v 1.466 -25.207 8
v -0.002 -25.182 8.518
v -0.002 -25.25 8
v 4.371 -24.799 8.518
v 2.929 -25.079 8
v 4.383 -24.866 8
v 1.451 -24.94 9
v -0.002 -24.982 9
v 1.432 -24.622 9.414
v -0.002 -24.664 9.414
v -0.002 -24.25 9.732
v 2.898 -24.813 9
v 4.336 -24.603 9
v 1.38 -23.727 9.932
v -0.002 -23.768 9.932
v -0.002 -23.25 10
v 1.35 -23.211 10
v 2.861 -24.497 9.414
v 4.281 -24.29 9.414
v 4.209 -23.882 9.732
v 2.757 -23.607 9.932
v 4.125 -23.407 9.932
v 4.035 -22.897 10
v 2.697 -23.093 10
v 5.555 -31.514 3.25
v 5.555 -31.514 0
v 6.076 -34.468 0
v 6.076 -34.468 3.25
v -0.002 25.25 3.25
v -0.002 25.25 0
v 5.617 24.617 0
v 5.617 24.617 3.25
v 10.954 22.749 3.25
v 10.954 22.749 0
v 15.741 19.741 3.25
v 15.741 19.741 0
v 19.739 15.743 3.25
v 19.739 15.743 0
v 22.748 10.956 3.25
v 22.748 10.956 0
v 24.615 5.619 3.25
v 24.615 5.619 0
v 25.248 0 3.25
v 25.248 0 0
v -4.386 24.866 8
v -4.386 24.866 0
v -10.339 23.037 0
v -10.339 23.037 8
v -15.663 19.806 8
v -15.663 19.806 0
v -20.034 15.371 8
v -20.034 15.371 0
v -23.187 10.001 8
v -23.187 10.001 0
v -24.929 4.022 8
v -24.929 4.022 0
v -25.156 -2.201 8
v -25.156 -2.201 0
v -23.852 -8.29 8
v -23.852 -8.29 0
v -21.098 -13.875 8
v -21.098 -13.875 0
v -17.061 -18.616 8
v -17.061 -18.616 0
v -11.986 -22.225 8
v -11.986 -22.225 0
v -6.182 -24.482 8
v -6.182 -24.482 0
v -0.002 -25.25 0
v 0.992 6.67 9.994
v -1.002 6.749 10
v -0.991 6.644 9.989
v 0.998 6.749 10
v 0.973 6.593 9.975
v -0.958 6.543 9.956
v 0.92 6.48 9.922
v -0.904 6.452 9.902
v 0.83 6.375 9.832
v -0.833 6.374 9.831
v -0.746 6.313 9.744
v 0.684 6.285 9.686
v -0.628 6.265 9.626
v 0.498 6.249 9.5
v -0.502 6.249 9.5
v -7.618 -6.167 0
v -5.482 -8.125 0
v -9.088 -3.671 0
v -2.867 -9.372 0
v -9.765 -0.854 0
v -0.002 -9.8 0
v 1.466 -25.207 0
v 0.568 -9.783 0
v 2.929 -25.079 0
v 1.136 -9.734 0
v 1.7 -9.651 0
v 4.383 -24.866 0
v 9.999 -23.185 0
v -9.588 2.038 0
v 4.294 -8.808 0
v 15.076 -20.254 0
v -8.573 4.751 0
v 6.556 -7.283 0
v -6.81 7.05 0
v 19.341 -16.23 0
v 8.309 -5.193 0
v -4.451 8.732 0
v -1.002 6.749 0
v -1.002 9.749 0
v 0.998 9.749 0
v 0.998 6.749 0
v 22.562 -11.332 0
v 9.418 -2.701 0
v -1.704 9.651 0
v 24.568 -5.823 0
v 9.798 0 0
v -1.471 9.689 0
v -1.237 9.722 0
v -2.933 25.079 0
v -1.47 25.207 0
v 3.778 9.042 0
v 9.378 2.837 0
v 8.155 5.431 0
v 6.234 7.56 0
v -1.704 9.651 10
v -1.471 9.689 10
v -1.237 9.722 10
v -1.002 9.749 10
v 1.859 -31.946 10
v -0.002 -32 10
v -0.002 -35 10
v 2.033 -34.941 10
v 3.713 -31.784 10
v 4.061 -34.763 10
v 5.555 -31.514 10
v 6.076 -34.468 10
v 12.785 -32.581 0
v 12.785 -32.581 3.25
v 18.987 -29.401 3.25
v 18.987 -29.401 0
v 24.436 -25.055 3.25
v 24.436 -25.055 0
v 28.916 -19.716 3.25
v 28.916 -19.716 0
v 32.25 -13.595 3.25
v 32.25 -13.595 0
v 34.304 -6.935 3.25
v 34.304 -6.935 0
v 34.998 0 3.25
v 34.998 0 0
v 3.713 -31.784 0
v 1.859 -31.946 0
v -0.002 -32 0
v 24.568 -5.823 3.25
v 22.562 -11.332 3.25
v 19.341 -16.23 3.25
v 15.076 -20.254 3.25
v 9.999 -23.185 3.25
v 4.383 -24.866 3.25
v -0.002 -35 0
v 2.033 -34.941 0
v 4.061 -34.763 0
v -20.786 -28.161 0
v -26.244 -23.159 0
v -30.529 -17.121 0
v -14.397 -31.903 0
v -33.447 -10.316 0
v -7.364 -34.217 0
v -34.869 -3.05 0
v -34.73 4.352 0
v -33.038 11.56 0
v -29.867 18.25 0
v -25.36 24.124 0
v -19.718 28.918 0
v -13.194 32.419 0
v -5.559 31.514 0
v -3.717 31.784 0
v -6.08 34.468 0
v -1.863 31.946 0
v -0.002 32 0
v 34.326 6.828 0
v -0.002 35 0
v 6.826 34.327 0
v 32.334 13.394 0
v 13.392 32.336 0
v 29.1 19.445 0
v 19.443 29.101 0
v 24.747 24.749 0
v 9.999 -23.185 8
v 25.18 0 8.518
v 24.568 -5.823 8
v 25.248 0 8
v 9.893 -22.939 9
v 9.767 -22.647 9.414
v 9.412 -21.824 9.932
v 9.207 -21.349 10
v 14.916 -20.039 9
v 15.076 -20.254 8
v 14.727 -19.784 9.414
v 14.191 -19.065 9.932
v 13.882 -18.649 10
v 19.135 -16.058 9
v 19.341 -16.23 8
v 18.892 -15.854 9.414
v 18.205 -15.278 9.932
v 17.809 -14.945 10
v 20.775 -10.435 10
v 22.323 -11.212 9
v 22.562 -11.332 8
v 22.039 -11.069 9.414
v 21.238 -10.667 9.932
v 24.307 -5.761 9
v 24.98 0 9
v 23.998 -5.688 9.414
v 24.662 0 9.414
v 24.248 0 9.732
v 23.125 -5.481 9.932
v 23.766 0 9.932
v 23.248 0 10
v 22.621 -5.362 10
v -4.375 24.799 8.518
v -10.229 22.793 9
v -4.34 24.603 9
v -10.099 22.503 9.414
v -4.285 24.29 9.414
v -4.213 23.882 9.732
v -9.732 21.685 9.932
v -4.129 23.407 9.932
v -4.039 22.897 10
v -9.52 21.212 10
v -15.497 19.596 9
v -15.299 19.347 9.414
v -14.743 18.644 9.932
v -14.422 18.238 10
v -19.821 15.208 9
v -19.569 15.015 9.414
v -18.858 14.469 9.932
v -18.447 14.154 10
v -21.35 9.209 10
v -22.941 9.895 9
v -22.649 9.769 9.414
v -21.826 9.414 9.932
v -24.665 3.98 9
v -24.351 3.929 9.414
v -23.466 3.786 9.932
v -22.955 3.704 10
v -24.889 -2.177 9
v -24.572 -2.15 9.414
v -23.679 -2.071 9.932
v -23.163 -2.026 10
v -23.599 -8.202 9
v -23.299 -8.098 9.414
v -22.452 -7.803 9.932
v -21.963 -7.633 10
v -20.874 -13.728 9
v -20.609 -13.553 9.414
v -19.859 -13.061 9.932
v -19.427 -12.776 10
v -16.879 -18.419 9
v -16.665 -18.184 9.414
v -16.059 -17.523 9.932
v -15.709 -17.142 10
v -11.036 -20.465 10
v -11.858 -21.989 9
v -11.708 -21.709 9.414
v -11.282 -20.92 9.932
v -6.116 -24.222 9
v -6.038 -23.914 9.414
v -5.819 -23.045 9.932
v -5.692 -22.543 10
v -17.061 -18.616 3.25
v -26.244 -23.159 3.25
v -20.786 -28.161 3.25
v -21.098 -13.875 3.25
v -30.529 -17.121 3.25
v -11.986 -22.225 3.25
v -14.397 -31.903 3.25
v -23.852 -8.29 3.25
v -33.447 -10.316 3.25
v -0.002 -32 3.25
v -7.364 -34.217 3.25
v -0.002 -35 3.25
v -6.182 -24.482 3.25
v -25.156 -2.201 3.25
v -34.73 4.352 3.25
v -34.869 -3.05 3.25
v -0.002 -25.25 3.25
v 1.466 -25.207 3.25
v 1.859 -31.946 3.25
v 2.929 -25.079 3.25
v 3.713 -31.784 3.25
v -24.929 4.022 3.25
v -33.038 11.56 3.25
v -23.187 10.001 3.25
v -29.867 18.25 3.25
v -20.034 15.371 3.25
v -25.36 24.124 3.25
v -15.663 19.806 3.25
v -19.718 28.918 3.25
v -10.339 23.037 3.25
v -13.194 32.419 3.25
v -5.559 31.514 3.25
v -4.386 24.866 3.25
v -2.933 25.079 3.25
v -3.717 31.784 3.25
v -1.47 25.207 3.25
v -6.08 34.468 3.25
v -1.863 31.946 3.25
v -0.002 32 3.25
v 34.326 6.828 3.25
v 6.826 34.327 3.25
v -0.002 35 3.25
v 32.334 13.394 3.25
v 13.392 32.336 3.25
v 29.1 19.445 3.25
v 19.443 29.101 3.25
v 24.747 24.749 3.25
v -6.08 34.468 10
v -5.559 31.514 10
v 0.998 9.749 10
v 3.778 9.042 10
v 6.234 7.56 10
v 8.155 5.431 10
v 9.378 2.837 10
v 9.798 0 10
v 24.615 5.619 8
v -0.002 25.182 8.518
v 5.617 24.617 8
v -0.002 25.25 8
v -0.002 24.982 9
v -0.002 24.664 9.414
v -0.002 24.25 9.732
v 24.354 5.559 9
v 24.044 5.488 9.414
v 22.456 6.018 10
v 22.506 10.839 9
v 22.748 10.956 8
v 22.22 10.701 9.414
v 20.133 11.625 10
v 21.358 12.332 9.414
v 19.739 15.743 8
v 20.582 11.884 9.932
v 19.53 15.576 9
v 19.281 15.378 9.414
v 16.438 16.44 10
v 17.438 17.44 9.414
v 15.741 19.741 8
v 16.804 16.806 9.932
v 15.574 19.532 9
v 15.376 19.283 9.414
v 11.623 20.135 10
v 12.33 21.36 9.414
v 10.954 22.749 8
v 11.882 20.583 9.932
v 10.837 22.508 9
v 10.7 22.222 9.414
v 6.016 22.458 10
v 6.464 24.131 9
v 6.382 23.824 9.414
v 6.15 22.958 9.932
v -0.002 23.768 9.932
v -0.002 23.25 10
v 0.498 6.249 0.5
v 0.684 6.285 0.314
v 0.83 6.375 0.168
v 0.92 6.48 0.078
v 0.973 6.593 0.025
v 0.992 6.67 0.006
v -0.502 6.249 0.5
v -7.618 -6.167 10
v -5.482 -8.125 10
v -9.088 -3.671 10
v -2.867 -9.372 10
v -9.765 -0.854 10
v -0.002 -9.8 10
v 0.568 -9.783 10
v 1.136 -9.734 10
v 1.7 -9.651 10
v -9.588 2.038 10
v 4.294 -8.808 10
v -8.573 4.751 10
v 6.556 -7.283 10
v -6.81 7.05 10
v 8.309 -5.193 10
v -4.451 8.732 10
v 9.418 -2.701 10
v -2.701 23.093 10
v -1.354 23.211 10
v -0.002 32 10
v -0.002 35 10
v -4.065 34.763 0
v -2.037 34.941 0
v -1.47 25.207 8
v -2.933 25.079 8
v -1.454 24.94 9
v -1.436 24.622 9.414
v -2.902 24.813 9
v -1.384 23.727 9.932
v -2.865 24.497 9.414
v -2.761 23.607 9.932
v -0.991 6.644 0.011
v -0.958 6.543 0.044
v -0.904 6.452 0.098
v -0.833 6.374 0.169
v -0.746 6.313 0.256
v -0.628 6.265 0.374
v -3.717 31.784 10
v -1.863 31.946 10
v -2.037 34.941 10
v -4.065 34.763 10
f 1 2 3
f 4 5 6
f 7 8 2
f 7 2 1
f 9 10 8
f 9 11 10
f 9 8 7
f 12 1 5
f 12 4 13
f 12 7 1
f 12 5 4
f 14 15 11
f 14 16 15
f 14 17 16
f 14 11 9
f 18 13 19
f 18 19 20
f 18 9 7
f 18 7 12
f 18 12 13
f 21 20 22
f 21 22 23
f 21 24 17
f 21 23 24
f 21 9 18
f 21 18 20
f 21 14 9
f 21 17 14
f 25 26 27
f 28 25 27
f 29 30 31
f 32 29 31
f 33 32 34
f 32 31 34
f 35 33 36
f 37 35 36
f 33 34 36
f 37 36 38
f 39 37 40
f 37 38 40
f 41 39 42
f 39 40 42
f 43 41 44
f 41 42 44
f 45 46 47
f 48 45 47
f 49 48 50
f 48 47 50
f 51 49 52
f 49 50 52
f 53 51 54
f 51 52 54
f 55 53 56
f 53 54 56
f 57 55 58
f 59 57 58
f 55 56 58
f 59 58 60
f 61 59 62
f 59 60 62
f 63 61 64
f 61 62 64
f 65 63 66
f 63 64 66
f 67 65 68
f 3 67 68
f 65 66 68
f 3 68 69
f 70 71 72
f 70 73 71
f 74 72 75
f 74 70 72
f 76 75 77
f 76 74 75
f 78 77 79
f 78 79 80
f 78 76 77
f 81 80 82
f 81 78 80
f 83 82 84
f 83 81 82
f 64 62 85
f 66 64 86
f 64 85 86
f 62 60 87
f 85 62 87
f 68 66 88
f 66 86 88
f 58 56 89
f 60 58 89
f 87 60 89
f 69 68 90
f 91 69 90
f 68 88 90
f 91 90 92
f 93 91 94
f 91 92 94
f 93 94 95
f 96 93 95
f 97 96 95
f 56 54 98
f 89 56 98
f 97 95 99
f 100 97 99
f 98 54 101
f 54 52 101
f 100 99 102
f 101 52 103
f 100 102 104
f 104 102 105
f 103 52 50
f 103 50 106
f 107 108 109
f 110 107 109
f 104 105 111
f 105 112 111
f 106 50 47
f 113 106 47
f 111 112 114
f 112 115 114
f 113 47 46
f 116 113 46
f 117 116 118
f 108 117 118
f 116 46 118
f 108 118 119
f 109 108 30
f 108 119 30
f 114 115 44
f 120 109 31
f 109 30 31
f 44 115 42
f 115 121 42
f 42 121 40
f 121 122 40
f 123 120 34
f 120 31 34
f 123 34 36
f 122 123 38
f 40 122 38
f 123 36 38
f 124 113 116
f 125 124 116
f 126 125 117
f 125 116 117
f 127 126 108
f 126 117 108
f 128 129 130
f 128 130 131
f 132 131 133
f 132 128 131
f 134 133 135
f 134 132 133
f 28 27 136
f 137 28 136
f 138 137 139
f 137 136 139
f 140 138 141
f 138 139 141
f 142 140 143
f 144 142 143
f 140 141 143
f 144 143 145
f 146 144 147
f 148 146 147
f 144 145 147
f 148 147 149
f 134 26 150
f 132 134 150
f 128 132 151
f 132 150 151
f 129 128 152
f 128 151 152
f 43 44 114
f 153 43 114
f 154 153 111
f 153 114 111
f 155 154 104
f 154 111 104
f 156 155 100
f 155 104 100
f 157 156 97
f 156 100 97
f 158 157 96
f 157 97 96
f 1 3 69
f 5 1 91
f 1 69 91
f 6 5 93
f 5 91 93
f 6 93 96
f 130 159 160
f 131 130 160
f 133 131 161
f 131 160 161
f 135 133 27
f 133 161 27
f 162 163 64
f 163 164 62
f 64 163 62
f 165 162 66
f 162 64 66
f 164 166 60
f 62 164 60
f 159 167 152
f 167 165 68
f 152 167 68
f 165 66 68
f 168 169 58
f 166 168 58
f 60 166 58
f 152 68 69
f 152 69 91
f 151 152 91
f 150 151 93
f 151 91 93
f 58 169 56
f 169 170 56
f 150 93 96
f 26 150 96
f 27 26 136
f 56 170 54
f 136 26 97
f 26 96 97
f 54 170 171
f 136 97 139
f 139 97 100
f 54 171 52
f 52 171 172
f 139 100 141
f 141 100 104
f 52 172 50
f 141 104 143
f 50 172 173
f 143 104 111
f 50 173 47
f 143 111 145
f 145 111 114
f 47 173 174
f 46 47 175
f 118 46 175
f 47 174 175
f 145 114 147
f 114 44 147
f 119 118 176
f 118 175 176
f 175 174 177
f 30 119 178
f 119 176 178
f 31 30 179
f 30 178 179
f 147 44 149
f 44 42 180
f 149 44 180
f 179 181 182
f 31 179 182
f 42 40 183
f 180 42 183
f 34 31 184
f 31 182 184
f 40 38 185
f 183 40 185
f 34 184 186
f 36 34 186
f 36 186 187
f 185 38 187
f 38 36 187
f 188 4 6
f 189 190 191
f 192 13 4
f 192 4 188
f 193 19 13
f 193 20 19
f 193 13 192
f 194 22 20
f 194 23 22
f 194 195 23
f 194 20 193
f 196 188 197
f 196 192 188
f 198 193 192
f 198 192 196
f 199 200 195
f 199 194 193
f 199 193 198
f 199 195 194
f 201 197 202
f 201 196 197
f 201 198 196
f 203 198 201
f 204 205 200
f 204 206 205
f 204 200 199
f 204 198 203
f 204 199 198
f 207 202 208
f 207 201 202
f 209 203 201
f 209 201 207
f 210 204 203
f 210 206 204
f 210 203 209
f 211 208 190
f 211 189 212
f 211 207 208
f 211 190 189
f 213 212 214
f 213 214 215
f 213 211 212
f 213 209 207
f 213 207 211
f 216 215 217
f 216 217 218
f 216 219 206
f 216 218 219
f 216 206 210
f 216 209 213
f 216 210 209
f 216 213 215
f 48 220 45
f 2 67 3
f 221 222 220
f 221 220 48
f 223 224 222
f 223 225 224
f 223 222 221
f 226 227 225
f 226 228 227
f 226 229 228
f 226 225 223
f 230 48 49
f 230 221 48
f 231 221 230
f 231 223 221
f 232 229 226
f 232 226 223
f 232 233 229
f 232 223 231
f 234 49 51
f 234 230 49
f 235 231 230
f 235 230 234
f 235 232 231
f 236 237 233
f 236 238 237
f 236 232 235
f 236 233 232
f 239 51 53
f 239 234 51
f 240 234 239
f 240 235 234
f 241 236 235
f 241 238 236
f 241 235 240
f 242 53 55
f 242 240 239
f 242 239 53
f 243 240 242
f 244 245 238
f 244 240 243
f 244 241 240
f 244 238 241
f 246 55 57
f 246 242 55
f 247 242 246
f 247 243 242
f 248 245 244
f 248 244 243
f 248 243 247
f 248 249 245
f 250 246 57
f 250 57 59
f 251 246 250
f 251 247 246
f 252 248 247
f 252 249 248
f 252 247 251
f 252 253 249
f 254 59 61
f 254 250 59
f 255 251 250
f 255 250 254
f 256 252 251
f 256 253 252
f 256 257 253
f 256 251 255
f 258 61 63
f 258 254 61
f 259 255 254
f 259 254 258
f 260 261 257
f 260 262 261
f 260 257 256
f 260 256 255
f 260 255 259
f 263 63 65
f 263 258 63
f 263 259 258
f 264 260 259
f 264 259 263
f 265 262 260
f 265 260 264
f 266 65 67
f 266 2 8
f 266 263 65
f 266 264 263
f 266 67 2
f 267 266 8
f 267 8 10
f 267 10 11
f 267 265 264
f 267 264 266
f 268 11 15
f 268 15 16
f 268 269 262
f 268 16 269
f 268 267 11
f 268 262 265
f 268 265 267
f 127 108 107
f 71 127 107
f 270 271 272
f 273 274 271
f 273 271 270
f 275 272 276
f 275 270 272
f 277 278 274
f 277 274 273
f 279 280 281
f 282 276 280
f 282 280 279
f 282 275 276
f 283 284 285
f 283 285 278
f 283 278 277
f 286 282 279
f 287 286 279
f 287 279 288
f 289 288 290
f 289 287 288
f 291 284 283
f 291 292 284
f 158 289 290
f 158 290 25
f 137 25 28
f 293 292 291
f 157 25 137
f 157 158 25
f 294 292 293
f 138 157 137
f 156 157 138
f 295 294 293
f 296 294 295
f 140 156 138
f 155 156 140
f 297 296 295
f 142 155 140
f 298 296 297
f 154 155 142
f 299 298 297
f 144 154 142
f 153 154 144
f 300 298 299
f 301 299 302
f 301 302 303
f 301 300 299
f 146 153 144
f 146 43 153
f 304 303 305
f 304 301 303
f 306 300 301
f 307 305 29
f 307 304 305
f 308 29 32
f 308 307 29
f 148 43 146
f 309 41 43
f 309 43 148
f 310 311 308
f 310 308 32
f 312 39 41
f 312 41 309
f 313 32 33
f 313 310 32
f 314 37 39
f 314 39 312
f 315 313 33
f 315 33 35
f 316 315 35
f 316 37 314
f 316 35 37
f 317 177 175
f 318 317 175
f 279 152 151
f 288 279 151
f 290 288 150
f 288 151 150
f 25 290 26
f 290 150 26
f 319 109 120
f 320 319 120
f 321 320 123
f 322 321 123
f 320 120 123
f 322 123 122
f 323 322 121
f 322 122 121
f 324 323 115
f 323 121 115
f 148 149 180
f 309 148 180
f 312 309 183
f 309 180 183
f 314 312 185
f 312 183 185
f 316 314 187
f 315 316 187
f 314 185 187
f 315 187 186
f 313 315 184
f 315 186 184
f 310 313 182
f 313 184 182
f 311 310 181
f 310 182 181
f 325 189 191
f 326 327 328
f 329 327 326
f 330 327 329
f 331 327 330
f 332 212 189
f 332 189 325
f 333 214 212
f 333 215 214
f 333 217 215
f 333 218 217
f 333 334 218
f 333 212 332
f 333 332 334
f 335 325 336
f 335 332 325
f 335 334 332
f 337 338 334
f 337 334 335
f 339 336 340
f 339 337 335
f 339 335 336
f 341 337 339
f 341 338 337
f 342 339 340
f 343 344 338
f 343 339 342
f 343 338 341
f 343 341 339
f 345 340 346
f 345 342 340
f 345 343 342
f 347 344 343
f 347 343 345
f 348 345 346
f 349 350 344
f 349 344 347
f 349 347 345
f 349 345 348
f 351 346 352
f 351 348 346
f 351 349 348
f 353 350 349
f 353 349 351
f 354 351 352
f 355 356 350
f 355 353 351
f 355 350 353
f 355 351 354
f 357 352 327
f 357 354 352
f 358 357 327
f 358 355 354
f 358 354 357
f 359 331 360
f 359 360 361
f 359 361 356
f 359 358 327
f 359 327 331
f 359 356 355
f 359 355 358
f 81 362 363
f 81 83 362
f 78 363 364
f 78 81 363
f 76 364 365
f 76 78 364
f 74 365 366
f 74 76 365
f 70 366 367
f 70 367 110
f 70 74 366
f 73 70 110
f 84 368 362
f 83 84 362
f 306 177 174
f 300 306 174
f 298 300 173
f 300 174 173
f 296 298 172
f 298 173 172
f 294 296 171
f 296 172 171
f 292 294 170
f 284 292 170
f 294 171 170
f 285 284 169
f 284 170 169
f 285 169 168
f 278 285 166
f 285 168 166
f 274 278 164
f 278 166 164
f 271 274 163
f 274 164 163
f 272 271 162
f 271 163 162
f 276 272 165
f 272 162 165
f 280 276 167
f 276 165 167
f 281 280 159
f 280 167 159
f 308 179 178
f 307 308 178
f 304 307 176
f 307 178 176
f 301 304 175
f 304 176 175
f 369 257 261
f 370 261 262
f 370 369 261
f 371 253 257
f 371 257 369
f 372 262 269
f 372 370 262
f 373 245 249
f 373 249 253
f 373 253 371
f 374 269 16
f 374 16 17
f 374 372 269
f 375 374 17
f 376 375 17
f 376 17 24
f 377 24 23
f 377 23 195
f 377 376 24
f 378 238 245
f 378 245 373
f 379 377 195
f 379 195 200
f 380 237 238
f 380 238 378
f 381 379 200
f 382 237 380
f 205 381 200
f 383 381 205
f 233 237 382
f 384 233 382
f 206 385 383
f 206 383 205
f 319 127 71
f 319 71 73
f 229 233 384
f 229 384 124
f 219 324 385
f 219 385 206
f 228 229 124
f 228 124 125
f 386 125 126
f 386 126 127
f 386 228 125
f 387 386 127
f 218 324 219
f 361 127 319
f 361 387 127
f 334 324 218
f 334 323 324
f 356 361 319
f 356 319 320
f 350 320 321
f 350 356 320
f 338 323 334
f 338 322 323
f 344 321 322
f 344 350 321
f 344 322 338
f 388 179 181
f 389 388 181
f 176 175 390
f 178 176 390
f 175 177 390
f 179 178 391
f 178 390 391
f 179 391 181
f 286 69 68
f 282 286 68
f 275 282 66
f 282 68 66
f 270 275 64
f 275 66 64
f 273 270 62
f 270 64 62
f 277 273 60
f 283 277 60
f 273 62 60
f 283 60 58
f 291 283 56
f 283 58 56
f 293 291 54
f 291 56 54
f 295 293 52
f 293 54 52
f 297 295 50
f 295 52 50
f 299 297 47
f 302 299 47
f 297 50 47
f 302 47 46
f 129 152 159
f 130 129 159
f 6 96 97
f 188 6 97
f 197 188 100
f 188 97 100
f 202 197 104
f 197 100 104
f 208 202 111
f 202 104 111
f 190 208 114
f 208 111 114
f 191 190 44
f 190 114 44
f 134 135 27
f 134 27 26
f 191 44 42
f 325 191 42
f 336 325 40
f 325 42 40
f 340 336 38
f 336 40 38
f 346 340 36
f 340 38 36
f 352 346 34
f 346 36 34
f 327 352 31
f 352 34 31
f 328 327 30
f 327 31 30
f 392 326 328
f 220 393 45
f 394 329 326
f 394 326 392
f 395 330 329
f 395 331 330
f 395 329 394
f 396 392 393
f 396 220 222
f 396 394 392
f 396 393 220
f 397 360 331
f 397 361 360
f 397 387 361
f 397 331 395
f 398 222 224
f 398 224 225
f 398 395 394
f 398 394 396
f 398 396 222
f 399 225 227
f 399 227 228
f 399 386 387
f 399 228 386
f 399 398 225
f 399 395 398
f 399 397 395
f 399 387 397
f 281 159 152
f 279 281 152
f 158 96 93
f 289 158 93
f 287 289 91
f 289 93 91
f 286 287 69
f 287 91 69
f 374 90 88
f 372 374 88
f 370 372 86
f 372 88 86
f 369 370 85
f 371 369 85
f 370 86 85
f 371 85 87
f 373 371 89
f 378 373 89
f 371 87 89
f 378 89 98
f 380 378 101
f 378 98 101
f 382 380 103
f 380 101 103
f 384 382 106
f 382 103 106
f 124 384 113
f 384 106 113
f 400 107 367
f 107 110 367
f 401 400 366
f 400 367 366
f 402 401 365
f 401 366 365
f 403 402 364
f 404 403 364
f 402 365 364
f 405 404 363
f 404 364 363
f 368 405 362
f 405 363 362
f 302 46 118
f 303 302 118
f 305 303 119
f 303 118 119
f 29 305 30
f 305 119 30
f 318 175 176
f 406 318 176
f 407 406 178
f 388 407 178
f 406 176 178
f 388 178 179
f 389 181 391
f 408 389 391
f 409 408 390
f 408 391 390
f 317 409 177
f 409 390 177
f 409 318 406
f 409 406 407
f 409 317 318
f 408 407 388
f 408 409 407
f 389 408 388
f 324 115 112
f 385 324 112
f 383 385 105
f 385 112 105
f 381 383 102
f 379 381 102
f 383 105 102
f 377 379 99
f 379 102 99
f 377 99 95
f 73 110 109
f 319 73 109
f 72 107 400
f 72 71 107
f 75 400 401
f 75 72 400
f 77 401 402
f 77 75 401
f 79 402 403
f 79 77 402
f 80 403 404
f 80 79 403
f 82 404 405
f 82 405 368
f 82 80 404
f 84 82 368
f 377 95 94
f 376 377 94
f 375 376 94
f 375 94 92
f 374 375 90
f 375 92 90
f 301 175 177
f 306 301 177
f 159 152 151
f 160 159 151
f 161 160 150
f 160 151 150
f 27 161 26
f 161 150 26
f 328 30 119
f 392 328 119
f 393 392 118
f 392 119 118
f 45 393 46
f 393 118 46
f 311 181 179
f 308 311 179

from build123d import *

# Parameters (mm, degrees)
F1_DEPTH = 10
F2_DEPTH = 3.25
F3_R     = 2
F4_R     = 0.5


with BuildPart() as f1:
    # F0 (on Top) → F1 (new body)
    with BuildSketch(Plane.XY):
        with BuildLine():
            Line((-1.7036226104, 9.6511124089), (-4.3864869554, 24.8663921929))
            ThreePointArc((-4.3864869554, 24.8663921929), (-25.1557865961, -2.200686075), (-0.0018704693, -25.2500035706))
            Line((-0.0018704693, -25.2500035706), (-0.0018704693, -9.8000035706))
            ThreePointArc((-0.0018704693, -9.8000035706), (-9.7645785106, -0.8541298496), (-1.7036226104, 9.6511124089))
        make_face()
        with BuildLine():
            Line((-0.0018704693, 9.7999964294), (-0.0018704693, 25.2499964294))
            ThreePointArc((-0.0018704693, 25.2499964294), (-2.2025529737, 25.1539125562), (-4.3864869554, 24.8663921929))
            Line((-4.3864869554, 24.8663921929), (-1.7036226104, 9.6511124089))
            ThreePointArc((-1.7036226104, 9.6511124089), (-1.3536300453, 9.7063214831), (-1.0018704693, 9.7488425149))
            ThreePointArc((-1.0018704693, 9.7488425149), (-0.5025242226, 9.7871995957), (-0.0018704693, 9.7999964294))
        make_face()
        with BuildLine():
            ThreePointArc((4.3827460168, -24.8663993342), (19.3407517195, -16.2303907152), (25.2481295307, -3.5706e-06))
            ThreePointArc((25.2481295307, -3.5706e-06), (17.8525757557, 17.8544426543), (-0.0018704693, 25.2499964294))
            Line((-0.0018704693, 25.2499964294), (-0.0018704693, 9.7999964294))
            ThreePointArc((-0.0018704693, 9.7999964294), (0.4987832841, 9.7871995957), (0.9981295307, 9.7488425149))
            ThreePointArc((0.9981295307, 9.7488425149), (7.2727429225, 6.5665784931), (9.7981295307, -3.5706e-06))
            ThreePointArc((9.7981295307, -3.5706e-06), (7.5053650733, -6.2993221456), (1.6998816719, -9.6511195502))
            Line((1.6998816719, -9.6511195502), (4.3827460168, -24.8663993342))
        make_face()
        with BuildLine():
            ThreePointArc((-0.0018704693, -25.2500035706), (2.1988120351, -25.1539196974), (4.3827460168, -24.8663993342))
            Line((4.3827460168, -24.8663993342), (1.6998816719, -9.6511195502))
            ThreePointArc((1.6998816719, -9.6511195502), (0.8522558097, -9.7627116119), (-0.0018704693, -9.8000035706))
            Line((-0.0018704693, -9.8000035706), (-0.0018704693, -25.2500035706))
        make_face()
        with BuildLine():
            ThreePointArc((0.9981295307, 9.7488425149), (0.4987832841, 9.7871995957), (-0.0018704693, 9.7999964294))
            Line((-0.0018704693, 9.7999964294), (-0.0018704693, 6.2488425149))
            Line((-0.0018704693, 6.2488425149), (0.9981295307, 6.2488425149))
            Line((0.9981295307, 6.2488425149), (0.9981295307, 9.7488425149))
        make_face()
        with BuildLine():
            Line((-0.0018704693, 6.2488425149), (-0.0018704693, 9.7999964294))
            ThreePointArc((-0.0018704693, 9.7999964294), (-0.5025242226, 9.7871995957), (-1.0018704693, 9.7488425149))
            Line((-1.0018704693, 9.7488425149), (-1.0018704693, 6.2488425149))
            Line((-1.0018704693, 6.2488425149), (-0.0018704693, 6.2488425149))
        make_face()
    extrude(amount=F1_DEPTH)

    # F3
    f3_edges = [f1.edges().sort_by_distance(p)[0] for p in [
        (-0.00187, 25.249996, 10),
    ]]
    fillet(f3_edges, radius=F3_R)

    # F4
    f4_edges = [f1.edges().sort_by_distance(p)[0] for p in [
        (0.99813, 6.248843, 5),
        (-1.00187, 6.248843, 5),
        (-0.00187, 6.248843, 10),
        (-0.00187, 6.248843, 0),
    ]]
    fillet(f4_edges, radius=F4_R)


with BuildPart() as f1b:
    # F0 (on Top) → F1, piece 2 (new body)
    with BuildSketch(Plane.XY):
        with BuildLine():
            ThreePointArc((-5.5586121546, 31.5138445258), (-2.7908542372, 31.8782267683), (-0.0018704693, 31.9999964294))
            Line((-0.0018704693, 31.9999964294), (-0.0018704693, 34.9999964294))
            ThreePointArc((-0.0018704693, 34.9999964294), (-3.0523214654, 34.8668108626), (-6.0795566876, 34.4682677848))
            Line((-6.0795566876, 34.4682677848), (-5.5586121546, 31.5138445258))
        make_face()
    extrude(amount=F1_DEPTH)


with BuildPart() as f1c:
    # F0 (on Top) → F1, piece 3 (new body)
    with BuildSketch(Plane.XY):
        with BuildLine():
            Line((6.0758157491, -34.4682749261), (5.5548712161, -31.513851667))
            ThreePointArc((5.5548712161, -31.513851667), (2.7871132987, -31.8782339096), (-0.0018704693, -32.0000035706))
            Line((-0.0018704693, -32.0000035706), (-0.0018704693, -35.0000035706))
            ThreePointArc((-0.0018704693, -35.0000035706), (3.0485805269, -34.8668180038), (6.0758157491, -34.4682749261))
        make_face()
    extrude(amount=F1_DEPTH)


with BuildPart() as f2:
    # F0 (on Top) → F2 (new body)
    with BuildSketch(Plane.XY):
        with BuildLine():
            ThreePointArc((-0.0018704693, -25.2500035706), (-25.1557865961, -2.200686075), (-4.3864869554, 24.8663921929))
            Line((-4.3864869554, 24.8663921929), (-5.5586121546, 31.5138445258))
            ThreePointArc((-5.5586121546, 31.5138445258), (-31.8801008082, -2.7889873386), (-0.0018704693, -32.0000035706))
            Line((-0.0018704693, -32.0000035706), (-0.0018704693, -25.2500035706))
        make_face()
        with BuildLine():
            ThreePointArc((-0.0018704693, -32.0000035706), (-31.8801008082, -2.7889873386), (-5.5586121546, 31.5138445258))
            Line((-5.5586121546, 31.5138445258), (-6.0795566876, 34.4682677848))
            ThreePointArc((-6.0795566876, 34.4682677848), (-34.8686849025, -3.0504545668), (-0.0018704693, -35.0000035706))
            Line((-0.0018704693, -35.0000035706), (-0.0018704693, -32.0000035706))
        make_face()
        with BuildLine():
            ThreePointArc((-4.3864869554, 24.8663921929), (-2.2025529737, 25.1539125562), (-0.0018704693, 25.2499964294))
            Line((-0.0018704693, 25.2499964294), (-0.0018704693, 31.9999964294))
            ThreePointArc((-0.0018704693, 31.9999964294), (-2.7908542372, 31.8782267683), (-5.5586121546, 31.5138445258))
            Line((-5.5586121546, 31.5138445258), (-4.3864869554, 24.8663921929))
        make_face()
        with BuildLine():
            Line((-0.0018704693, 34.9999964294), (-0.0018704693, 31.9999964294))
            ThreePointArc((-0.0018704693, 31.9999964294), (22.6255465287, 22.6274134273), (31.9981295307, -3.5706e-06))
            ThreePointArc((31.9981295307, -3.5706e-06), (24.5115517105, -20.5692070806), (5.5548712161, -31.513851667))
            Line((5.5548712161, -31.513851667), (6.0758157491, -34.4682749261))
            ThreePointArc((6.0758157491, -34.4682749261), (26.8096850399, -22.4975699097), (34.9981295307, -3.5706e-06))
            ThreePointArc((34.9981295307, -3.5706e-06), (24.7468668723, 24.7487337709), (-0.0018704693, 34.9999964294))
        make_face()
        with BuildLine():
            ThreePointArc((-0.0018704693, 25.2499964294), (17.8525757557, 17.8544426543), (25.2481295307, -3.5706e-06))
            ThreePointArc((25.2481295307, -3.5706e-06), (19.3407517195, -16.2303907152), (4.3827460168, -24.8663993342))
            Line((4.3827460168, -24.8663993342), (5.5548712161, -31.513851667))
            ThreePointArc((5.5548712161, -31.513851667), (24.5115517105, -20.5692070806), (31.9981295307, -3.5706e-06))
            ThreePointArc((31.9981295307, -3.5706e-06), (22.6255465287, 22.6274134273), (-0.0018704693, 31.9999964294))
            Line((-0.0018704693, 31.9999964294), (-0.0018704693, 25.2499964294))
        make_face()
        with BuildLine():
            Line((5.5548712161, -31.513851667), (4.3827460168, -24.8663993342))
            ThreePointArc((4.3827460168, -24.8663993342), (2.1988120351, -25.1539196974), (-0.0018704693, -25.2500035706))
            Line((-0.0018704693, -25.2500035706), (-0.0018704693, -32.0000035706))
            ThreePointArc((-0.0018704693, -32.0000035706), (2.7871132987, -31.8782339096), (5.5548712161, -31.513851667))
        make_face()
    extrude(amount=F2_DEPTH)


solid = Compound([f1.part, f1b.part, f1c.part, f2.part])
